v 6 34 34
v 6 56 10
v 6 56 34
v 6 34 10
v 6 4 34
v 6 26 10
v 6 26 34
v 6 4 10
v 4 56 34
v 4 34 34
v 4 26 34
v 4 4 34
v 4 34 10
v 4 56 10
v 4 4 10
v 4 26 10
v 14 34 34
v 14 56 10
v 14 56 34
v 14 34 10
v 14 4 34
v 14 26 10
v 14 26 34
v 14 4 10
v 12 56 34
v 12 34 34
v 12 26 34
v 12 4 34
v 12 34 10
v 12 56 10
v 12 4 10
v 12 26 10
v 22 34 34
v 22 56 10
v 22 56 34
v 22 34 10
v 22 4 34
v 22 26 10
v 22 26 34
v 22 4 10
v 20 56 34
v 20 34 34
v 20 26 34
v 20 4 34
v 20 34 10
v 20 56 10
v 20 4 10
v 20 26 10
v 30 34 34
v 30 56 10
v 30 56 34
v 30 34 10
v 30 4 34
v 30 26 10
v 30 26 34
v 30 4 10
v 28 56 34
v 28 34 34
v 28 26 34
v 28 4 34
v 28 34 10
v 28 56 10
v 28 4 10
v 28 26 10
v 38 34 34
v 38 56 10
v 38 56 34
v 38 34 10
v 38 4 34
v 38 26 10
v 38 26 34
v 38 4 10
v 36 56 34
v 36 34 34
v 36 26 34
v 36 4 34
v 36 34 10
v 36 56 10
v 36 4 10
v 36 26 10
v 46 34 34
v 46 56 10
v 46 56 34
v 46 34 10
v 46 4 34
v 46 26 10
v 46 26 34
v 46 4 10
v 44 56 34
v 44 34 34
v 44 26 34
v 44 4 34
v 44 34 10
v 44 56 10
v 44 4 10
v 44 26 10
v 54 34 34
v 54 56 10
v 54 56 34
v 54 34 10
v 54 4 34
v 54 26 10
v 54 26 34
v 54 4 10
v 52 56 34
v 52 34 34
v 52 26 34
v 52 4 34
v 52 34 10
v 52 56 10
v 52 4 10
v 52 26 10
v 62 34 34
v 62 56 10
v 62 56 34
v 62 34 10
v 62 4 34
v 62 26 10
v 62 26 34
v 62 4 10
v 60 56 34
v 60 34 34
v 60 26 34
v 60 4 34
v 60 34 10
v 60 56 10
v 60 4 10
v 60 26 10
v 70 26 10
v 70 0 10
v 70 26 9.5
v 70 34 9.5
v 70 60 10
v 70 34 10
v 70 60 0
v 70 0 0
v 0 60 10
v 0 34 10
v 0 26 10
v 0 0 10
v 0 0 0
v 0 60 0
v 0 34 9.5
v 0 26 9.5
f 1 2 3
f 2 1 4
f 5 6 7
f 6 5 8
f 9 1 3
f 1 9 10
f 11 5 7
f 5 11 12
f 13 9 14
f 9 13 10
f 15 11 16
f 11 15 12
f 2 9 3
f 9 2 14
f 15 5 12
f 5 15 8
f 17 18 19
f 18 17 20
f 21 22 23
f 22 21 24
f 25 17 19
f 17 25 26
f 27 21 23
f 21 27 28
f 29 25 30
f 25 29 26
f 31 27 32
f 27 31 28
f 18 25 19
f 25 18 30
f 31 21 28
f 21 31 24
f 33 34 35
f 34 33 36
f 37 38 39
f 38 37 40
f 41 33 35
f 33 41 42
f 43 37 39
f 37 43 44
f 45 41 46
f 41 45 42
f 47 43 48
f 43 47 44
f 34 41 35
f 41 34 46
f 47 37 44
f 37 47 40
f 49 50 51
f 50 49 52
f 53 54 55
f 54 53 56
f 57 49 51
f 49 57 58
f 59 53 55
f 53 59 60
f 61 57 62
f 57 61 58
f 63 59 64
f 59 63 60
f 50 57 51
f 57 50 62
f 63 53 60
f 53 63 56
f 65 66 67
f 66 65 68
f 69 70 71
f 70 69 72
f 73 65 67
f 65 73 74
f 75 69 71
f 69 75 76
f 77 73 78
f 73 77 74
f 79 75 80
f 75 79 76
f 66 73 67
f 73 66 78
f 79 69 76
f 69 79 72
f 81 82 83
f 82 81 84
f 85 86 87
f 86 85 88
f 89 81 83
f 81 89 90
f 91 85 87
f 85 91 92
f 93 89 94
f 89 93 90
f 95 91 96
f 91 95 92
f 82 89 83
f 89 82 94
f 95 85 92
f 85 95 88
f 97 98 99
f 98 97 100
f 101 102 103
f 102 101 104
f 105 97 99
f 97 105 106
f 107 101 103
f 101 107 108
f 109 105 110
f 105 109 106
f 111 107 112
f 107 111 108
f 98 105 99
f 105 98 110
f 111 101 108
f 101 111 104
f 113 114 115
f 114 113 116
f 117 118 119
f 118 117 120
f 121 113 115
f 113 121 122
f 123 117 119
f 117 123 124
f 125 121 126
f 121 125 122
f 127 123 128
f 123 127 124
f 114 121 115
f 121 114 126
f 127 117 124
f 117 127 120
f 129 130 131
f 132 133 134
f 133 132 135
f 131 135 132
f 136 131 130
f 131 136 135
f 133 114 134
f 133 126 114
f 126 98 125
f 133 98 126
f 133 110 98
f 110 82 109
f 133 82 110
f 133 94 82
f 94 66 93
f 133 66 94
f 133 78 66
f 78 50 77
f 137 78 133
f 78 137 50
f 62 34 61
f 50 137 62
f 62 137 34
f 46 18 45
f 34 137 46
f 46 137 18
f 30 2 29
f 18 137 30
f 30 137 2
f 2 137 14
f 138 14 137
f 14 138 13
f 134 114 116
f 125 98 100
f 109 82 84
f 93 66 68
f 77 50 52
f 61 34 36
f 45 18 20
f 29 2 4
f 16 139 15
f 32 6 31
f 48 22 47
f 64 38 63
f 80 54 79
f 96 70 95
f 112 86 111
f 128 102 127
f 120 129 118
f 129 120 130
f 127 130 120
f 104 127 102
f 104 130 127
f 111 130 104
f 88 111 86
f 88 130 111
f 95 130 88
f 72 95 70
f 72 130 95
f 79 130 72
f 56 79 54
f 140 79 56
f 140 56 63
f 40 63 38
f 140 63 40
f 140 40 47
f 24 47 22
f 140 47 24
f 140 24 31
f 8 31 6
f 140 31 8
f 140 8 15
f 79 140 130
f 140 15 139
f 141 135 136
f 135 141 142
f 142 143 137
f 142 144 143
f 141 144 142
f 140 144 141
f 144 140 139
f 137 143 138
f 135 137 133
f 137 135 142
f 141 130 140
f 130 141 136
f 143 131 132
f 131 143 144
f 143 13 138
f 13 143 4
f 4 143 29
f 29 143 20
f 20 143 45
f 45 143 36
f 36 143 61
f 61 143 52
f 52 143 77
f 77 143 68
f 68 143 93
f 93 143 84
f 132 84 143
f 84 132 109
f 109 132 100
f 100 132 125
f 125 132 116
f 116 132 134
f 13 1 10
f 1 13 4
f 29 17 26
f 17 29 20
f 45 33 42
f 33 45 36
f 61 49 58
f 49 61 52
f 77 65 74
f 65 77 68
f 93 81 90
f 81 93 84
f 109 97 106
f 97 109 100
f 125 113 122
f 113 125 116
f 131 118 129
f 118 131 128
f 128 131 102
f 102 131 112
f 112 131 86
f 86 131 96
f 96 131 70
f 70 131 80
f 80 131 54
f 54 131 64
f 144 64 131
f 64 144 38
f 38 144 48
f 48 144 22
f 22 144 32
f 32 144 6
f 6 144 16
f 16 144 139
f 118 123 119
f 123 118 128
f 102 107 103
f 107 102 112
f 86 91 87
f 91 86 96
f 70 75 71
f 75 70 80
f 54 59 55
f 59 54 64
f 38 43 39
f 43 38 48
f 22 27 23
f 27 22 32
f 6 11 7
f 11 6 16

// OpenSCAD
$fn = 32;

// ----------------------------------------------------------------------
// Heatsink: slotted fin block
// ----------------------------------------------------------------------

// --- parameters (mm) ---
base_l = 70;              // base length, X
base_w = 60;              // base width, Y
base_t = 10;              // base plate thickness
fin_h = 25;               // fin height above the base
fin_t = 2;                // fin thickness
edge = 4;                 // margin from the base ends
pitch = 8;                // fin pitch
slot_w = 8;               // central slot width, Y

n_fins = floor((base_l - 2 * edge - fin_t) / pitch) + 1;  // fin count
total_h = base_t + fin_h - 1;  // overall height

difference() {
union() {
  cube([base_l, base_w, base_t]);
  for (i = [0 : n_fins - 1])
    translate([edge + i * pitch, edge, base_t - 1])
      cube([fin_t, base_w - 2 * edge, fin_h]);
}
  translate([-1, base_w / 2 - slot_w / 2, base_t - 0.5])
    cube([base_l + 2, slot_w, fin_h + 2]);
}
